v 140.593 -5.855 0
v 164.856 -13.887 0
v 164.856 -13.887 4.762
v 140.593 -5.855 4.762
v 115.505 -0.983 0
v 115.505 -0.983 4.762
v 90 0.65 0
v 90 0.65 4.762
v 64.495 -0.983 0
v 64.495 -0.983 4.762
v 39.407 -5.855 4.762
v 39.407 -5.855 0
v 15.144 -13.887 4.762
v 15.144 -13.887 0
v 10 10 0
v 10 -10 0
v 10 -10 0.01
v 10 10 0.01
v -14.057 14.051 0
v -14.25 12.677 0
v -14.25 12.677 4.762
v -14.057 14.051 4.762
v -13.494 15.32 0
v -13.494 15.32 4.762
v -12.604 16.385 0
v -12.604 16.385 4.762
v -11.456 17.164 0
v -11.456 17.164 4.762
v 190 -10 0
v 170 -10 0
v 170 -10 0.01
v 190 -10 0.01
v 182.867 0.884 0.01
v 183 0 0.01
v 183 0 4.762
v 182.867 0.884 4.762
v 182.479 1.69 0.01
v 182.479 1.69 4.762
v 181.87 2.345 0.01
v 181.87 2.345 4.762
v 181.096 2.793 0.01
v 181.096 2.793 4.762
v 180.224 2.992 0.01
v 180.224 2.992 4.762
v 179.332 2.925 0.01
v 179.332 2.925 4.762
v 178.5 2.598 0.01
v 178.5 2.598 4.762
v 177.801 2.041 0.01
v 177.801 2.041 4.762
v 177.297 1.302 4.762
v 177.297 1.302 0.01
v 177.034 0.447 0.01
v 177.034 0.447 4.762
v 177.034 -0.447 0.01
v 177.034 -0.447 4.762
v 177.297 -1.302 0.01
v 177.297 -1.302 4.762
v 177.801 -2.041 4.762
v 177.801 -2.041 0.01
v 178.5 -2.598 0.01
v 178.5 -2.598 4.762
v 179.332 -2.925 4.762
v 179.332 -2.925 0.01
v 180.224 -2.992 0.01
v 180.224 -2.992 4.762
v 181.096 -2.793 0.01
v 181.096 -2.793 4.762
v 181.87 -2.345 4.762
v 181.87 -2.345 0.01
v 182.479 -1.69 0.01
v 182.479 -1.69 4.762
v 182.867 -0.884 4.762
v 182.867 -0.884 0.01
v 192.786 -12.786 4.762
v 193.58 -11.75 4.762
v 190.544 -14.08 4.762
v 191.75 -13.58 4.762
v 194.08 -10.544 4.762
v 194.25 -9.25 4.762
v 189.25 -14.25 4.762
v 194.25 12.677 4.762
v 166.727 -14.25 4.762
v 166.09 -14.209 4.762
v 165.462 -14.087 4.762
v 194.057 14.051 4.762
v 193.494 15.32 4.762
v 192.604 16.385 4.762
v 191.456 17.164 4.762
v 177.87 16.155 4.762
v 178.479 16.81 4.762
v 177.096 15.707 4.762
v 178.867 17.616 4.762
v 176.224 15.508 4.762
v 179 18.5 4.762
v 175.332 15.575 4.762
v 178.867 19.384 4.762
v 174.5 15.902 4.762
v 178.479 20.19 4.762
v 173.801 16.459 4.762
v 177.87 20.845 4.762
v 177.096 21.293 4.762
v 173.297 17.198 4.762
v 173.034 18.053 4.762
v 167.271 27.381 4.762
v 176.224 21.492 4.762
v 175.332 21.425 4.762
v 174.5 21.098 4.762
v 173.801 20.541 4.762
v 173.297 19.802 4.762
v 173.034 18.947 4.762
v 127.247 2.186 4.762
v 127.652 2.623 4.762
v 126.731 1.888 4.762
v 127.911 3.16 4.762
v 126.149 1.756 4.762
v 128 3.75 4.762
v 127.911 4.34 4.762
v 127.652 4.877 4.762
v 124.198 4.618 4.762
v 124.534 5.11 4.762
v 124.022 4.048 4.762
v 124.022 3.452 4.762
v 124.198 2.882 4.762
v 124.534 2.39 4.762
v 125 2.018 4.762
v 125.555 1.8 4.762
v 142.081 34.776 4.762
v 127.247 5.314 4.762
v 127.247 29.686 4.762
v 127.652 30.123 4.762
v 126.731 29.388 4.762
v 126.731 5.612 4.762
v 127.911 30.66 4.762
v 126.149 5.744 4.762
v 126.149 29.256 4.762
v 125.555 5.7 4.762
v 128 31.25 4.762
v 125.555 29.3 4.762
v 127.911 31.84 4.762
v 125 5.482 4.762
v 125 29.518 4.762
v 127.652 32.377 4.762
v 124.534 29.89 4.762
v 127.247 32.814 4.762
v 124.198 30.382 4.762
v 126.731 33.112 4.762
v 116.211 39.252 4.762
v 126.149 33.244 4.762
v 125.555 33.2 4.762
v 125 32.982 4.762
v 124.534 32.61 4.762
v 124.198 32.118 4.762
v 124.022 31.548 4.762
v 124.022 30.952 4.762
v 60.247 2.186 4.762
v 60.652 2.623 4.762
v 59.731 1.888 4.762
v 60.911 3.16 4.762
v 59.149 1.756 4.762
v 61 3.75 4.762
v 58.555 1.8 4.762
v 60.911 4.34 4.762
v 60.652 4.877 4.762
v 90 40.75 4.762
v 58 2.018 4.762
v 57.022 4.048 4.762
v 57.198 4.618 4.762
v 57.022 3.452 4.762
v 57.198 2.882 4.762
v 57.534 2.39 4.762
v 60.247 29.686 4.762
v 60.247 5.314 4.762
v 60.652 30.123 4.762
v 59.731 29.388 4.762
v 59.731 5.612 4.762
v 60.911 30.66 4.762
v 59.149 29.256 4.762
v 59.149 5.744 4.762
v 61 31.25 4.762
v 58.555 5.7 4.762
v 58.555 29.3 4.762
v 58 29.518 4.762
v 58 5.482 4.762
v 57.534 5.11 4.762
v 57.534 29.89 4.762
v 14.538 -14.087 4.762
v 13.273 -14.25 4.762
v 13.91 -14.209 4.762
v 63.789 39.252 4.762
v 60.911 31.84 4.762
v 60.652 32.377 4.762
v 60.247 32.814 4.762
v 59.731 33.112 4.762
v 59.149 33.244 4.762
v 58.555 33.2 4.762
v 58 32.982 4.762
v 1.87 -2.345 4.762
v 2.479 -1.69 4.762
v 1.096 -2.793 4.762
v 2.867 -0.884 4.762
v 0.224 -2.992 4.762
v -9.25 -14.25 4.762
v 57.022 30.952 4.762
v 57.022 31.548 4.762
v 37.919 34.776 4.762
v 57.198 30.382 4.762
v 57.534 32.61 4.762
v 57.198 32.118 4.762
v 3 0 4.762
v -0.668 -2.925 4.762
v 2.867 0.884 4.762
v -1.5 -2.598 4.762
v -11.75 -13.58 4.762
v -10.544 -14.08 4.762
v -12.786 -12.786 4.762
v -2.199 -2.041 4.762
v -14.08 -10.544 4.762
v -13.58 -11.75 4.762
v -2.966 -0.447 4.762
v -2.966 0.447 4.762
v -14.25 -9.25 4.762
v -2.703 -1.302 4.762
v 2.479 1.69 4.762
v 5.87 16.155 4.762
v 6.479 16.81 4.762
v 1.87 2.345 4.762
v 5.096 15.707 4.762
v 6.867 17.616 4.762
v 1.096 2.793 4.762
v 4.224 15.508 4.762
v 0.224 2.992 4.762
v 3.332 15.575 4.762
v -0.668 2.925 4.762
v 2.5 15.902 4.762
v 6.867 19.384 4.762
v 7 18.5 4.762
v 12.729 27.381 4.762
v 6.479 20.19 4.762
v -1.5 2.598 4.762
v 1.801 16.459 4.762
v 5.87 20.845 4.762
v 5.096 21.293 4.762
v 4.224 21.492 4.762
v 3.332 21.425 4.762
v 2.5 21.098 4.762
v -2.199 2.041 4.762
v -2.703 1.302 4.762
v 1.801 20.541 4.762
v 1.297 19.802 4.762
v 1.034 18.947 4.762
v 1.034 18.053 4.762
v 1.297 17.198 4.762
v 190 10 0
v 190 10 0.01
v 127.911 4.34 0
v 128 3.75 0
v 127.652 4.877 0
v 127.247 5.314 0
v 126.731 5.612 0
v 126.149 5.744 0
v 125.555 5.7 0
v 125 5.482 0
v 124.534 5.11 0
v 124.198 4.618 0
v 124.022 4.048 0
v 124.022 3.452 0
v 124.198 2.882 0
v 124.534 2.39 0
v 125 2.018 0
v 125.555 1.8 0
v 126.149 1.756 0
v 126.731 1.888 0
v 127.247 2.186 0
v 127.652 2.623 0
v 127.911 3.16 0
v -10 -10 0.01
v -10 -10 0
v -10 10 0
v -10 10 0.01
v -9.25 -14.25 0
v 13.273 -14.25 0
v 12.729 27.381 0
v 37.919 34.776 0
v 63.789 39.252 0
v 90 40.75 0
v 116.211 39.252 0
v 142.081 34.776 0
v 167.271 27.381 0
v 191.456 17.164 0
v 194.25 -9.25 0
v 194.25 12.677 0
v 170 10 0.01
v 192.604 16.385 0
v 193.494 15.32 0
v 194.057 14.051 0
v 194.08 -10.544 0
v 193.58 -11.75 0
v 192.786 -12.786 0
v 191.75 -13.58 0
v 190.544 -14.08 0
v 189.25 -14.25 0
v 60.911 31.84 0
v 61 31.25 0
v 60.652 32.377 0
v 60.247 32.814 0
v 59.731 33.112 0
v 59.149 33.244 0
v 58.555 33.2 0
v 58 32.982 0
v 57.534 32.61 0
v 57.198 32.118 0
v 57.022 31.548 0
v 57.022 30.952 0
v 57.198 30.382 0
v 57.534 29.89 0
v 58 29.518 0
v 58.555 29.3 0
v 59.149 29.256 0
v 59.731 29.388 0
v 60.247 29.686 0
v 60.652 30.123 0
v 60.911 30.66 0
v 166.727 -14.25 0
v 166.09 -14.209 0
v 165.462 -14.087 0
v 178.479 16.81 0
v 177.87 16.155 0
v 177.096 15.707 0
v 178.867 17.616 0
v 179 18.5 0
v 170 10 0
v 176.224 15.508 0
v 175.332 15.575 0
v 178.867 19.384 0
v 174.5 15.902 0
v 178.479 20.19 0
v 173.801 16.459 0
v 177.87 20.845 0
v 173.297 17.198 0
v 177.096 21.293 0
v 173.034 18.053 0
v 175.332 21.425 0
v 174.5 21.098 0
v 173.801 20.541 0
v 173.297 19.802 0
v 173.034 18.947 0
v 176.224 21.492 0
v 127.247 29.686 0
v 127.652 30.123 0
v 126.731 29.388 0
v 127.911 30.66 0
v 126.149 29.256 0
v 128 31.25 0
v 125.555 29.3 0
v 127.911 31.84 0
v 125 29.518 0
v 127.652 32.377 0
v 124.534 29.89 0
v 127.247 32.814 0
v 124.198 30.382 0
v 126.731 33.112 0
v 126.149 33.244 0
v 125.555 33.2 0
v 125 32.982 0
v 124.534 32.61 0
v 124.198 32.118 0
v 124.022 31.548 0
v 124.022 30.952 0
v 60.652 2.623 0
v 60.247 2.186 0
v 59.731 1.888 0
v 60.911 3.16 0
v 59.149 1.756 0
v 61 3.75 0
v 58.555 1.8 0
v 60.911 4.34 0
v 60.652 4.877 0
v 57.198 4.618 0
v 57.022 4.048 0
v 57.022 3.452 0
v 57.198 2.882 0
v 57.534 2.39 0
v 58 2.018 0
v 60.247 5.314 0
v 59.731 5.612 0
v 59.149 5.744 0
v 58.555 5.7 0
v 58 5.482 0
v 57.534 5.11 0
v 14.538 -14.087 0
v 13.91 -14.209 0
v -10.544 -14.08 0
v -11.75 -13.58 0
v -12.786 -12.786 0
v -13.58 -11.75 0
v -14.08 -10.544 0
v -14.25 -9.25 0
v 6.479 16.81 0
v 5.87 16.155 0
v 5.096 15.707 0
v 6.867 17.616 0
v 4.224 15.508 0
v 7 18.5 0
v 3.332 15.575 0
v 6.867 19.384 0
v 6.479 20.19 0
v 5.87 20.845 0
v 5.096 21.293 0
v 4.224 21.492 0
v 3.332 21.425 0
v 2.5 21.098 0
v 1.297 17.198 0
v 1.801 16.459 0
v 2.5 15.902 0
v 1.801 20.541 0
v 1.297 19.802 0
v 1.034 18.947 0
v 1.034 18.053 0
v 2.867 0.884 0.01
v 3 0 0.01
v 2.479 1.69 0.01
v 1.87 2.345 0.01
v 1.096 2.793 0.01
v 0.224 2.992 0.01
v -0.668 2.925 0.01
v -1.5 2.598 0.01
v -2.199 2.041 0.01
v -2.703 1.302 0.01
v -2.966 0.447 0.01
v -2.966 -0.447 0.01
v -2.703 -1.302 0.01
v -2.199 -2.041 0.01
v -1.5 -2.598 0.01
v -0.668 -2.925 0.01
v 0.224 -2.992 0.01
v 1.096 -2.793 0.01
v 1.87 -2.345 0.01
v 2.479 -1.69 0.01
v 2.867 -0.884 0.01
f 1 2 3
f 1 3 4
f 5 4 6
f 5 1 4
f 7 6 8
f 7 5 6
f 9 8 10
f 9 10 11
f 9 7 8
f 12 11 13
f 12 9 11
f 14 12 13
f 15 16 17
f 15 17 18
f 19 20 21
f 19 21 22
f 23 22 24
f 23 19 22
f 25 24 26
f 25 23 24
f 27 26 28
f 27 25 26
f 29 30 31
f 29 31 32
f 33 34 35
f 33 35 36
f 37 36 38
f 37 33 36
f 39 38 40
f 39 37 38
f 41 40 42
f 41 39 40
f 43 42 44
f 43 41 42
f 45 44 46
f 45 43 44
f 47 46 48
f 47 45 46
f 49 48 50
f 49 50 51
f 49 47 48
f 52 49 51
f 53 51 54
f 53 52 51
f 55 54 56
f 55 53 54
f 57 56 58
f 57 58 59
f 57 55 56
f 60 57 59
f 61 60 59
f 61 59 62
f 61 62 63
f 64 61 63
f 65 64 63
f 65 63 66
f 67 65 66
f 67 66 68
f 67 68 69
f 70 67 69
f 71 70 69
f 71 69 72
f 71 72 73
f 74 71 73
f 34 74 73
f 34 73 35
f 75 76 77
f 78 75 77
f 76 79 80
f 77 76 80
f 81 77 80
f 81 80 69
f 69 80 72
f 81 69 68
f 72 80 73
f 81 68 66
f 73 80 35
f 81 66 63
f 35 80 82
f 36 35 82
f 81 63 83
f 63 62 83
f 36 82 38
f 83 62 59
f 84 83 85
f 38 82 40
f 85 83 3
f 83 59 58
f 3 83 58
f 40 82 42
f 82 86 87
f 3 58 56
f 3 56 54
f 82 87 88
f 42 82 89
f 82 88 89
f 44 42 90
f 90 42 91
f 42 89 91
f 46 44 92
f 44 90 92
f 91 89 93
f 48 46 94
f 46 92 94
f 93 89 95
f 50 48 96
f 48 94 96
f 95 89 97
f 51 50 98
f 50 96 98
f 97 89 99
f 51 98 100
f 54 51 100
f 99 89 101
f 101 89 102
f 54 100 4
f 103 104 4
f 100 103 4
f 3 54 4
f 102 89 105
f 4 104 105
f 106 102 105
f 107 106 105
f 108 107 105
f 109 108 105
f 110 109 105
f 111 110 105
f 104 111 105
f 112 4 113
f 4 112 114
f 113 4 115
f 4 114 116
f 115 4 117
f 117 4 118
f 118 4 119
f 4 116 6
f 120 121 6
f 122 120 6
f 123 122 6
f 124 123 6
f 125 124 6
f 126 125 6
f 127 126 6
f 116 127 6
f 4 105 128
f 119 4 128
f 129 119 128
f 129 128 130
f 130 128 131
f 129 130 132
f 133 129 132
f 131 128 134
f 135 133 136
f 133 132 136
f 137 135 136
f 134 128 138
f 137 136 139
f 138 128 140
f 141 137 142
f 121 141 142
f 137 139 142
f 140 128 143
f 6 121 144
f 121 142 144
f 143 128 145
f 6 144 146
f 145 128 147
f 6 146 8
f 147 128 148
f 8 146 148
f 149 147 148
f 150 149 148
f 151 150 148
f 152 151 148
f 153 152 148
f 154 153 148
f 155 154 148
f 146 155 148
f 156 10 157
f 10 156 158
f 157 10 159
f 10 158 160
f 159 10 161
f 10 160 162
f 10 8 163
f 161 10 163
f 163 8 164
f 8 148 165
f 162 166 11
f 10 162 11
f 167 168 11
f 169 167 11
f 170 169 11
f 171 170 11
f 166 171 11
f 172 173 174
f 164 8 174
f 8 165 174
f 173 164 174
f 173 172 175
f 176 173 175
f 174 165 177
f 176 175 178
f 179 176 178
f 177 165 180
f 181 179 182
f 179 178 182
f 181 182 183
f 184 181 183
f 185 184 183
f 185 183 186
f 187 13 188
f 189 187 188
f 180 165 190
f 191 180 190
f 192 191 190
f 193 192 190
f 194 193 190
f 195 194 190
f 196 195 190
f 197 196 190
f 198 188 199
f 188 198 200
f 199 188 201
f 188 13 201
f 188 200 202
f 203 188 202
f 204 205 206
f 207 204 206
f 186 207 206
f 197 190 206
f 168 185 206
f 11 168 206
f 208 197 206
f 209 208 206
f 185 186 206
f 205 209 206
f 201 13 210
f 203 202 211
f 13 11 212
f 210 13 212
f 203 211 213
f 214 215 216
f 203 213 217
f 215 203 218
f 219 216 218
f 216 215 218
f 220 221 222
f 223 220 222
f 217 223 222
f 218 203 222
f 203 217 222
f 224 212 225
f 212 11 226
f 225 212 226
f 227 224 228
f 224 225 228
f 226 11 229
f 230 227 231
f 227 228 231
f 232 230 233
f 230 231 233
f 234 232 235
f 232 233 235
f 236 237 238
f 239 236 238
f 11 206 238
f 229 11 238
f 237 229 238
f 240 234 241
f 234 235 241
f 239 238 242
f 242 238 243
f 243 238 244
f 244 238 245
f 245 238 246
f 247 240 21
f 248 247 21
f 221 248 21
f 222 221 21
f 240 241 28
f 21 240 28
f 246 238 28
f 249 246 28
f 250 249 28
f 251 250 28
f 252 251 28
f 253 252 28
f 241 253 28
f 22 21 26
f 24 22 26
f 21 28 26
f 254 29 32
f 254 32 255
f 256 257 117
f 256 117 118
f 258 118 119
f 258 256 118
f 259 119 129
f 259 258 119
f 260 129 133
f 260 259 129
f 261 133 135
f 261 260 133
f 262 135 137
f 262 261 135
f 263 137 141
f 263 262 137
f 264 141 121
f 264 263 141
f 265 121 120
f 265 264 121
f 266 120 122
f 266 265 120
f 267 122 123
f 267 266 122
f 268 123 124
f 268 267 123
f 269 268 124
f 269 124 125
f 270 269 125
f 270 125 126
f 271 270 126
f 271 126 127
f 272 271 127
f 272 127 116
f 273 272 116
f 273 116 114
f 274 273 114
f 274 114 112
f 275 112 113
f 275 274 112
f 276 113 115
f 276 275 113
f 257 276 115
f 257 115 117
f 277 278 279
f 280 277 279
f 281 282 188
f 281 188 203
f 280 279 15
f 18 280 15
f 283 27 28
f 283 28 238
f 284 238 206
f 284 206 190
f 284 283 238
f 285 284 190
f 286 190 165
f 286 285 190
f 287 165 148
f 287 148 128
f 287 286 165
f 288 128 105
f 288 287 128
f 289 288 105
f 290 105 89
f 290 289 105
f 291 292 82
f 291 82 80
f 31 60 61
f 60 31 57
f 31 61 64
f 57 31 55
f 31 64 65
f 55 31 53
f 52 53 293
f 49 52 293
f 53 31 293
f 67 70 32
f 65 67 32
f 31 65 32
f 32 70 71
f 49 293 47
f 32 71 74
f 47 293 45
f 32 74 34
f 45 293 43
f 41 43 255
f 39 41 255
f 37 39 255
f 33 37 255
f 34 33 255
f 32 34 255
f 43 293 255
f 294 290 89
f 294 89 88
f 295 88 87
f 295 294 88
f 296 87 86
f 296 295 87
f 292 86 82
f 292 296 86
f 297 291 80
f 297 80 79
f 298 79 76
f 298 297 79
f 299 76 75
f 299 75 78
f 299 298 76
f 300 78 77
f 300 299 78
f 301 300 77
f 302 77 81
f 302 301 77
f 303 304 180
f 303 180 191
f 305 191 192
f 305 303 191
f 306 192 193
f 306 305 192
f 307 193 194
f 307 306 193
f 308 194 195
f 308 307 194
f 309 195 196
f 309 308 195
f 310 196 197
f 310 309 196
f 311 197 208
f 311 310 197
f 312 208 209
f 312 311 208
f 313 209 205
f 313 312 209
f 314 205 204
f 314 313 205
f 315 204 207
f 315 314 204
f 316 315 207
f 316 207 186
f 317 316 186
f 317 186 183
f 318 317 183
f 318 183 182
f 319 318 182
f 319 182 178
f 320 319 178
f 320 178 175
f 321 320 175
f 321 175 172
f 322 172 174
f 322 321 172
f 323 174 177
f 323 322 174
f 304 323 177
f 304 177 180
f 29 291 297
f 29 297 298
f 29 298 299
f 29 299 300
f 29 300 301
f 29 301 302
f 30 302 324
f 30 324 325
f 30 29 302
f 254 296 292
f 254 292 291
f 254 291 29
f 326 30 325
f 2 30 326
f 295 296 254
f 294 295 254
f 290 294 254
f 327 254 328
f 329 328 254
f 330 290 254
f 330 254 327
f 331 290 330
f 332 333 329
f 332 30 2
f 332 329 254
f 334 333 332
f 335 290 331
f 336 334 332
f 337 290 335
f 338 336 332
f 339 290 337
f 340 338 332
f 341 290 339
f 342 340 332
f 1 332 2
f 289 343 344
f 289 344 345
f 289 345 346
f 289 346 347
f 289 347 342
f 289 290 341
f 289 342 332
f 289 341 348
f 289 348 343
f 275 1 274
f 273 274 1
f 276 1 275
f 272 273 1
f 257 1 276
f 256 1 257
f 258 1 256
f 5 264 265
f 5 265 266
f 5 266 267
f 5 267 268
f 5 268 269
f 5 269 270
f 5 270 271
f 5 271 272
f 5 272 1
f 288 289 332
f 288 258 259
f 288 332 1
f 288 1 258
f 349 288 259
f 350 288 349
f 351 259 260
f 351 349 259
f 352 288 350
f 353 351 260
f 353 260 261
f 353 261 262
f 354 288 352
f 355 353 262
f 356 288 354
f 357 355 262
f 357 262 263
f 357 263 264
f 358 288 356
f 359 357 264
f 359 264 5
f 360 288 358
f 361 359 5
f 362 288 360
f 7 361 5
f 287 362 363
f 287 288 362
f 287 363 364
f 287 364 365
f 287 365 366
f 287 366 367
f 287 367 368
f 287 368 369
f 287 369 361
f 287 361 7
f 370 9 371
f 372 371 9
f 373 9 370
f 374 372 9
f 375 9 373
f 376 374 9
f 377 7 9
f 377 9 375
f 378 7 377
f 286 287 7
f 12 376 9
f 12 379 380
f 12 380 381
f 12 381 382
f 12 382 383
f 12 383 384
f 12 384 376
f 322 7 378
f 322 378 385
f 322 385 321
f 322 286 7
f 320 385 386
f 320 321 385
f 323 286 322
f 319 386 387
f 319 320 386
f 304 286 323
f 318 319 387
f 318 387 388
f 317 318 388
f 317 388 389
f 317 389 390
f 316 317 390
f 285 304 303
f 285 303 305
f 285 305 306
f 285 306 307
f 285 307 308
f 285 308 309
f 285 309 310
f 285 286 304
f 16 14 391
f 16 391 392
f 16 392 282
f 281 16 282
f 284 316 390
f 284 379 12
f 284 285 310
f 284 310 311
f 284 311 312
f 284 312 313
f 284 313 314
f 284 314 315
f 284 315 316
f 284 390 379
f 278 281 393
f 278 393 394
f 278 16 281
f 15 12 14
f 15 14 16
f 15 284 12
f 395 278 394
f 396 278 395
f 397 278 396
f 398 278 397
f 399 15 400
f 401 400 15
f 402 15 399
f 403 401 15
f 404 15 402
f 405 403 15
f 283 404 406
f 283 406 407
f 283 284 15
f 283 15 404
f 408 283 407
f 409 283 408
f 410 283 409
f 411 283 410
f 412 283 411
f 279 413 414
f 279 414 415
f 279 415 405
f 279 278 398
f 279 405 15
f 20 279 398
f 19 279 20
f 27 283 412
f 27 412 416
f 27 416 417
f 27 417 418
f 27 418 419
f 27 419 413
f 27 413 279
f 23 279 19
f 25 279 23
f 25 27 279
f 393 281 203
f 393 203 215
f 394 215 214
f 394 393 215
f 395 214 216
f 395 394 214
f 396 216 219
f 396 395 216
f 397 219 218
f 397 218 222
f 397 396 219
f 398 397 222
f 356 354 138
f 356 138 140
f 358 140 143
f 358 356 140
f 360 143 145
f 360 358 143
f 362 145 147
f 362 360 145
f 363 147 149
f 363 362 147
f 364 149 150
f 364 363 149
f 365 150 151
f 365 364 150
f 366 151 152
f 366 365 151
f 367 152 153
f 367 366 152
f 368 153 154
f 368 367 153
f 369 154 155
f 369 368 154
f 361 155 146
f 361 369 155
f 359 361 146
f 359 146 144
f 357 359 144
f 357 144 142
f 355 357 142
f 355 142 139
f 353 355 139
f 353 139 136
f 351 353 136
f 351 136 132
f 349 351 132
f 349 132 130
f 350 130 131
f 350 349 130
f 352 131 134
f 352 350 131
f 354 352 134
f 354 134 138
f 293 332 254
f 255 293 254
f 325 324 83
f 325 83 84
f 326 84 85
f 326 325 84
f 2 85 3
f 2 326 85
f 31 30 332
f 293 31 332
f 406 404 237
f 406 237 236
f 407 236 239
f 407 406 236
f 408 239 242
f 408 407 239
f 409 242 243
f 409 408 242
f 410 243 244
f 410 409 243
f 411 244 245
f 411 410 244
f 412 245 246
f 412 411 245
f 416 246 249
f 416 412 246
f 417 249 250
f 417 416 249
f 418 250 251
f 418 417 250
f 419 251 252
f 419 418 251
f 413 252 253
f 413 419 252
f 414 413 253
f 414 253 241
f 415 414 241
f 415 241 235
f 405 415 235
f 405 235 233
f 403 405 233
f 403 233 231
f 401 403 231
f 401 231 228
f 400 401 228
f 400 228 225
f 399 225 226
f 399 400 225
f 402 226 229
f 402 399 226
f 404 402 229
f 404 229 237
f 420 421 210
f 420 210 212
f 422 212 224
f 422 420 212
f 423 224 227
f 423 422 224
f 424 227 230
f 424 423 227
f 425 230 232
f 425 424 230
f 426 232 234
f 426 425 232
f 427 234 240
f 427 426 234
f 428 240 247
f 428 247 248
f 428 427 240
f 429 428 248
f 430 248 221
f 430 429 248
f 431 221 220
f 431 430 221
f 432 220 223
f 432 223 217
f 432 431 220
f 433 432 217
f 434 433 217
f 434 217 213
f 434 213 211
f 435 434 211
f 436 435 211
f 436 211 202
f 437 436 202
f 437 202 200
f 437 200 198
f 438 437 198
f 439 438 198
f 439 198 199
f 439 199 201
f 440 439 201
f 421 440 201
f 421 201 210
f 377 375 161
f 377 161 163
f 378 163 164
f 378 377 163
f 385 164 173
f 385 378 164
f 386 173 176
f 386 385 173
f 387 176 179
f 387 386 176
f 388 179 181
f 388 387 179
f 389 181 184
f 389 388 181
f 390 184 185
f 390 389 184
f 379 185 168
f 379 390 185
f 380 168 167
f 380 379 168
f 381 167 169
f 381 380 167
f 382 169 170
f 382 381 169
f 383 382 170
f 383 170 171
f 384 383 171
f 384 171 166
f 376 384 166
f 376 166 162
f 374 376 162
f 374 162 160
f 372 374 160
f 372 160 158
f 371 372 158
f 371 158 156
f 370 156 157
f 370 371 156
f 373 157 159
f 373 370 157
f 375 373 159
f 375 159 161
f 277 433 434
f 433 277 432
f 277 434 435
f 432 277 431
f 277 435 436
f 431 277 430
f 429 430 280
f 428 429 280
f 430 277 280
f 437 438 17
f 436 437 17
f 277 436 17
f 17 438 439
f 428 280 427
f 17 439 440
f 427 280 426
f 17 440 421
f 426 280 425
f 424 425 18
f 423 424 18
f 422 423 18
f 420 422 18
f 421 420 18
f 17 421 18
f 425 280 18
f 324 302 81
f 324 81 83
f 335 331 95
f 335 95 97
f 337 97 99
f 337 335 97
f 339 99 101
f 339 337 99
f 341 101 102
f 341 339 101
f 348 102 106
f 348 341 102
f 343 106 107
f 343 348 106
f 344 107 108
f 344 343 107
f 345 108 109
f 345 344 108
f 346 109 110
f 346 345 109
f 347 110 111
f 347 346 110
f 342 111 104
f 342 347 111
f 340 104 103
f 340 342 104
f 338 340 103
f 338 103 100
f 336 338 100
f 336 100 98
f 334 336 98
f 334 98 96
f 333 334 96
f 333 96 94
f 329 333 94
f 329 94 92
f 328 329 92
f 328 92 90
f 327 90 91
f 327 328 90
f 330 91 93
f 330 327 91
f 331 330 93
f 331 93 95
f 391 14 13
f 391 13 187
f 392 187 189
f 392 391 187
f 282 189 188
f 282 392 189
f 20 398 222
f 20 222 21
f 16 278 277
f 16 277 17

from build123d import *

# Parameters (mm, degrees)
SKETCH1_R           = 2
SKETCH1_R_2         = 3
BOSS_EXTRUDE1_DEPTH = 4.7625
SKETCH4_W           = 20
SKETCH4_H           = 20
CUT_EXTRUDE2_DEPTH  = 0.01


with BuildPart() as part:
    # Sketch1 → Boss-Extrude1 (new body)
    with BuildSketch(Plane.XY):
        with BuildLine():
            Line((-14.25, -9.25), (-14.25, 12.676812237))
            ThreePointArc((-14.25, 12.676812237), (-13.494277193, 15.319937491), (-11.455555556, 17.164074731))
            ThreePointArc((-11.455555556, 17.164074731), (90, 40.75), (191.455555556, 17.164074731))
            ThreePointArc((191.455555556, 17.164074731), (193.494277193, 15.319937491), (194.25, 12.676812237))
            Line((194.25, 12.676812237), (194.25, -9.25))
            ThreePointArc((194.25, -9.25), (192.785533906, -12.785533906), (189.25, -14.25))
            Line((189.25, -14.25), (166.727208071, -14.25))
            ThreePointArc((166.727208071, -14.25), (165.774029952, -14.158304338), (164.855812752, -13.886580589))
            ThreePointArc((164.855812752, -13.886580589), (90, 0.65019584), (15.144187248, -13.886580589))
            ThreePointArc((15.144187248, -13.886580589), (14.225970048, -14.158304338), (13.272791929, -14.25))
            Line((13.272791929, -14.25), (-9.25, -14.25))
            ThreePointArc((-9.25, -14.25), (-12.785533906, -12.785533906), (-14.25, -9.25))
        make_face()
        with Locations((59, 31.25)):
            Circle(SKETCH1_R, mode=Mode.SUBTRACT)
        with Locations((59, 3.75)):
            Circle(SKETCH1_R, mode=Mode.SUBTRACT)
        with Locations((126, 31.25)):
            Circle(SKETCH1_R, mode=Mode.SUBTRACT)
        with Locations((126, 3.75)):
            Circle(SKETCH1_R, mode=Mode.SUBTRACT)
        with Locations((180, 0)):
            Circle(SKETCH1_R_2, mode=Mode.SUBTRACT)
        Circle(SKETCH1_R_2, mode=Mode.SUBTRACT)
        with Locations((4, 18.5)):
            Circle(SKETCH1_R_2, mode=Mode.SUBTRACT)
        with Locations((176, 18.5)):
            Circle(SKETCH1_R_2, mode=Mode.SUBTRACT)
    extrude(amount=BOSS_EXTRUDE1_DEPTH)

    # Sketch4 → Cut-Extrude2 (cut)
    with BuildSketch(Plane.XY):
        Rectangle(SKETCH4_W, SKETCH4_H)
        with Locations((180, 0)):
            Rectangle(SKETCH4_W, SKETCH4_H)
    extrude(amount=CUT_EXTRUDE2_DEPTH, mode=Mode.SUBTRACT)


solid = part.part
